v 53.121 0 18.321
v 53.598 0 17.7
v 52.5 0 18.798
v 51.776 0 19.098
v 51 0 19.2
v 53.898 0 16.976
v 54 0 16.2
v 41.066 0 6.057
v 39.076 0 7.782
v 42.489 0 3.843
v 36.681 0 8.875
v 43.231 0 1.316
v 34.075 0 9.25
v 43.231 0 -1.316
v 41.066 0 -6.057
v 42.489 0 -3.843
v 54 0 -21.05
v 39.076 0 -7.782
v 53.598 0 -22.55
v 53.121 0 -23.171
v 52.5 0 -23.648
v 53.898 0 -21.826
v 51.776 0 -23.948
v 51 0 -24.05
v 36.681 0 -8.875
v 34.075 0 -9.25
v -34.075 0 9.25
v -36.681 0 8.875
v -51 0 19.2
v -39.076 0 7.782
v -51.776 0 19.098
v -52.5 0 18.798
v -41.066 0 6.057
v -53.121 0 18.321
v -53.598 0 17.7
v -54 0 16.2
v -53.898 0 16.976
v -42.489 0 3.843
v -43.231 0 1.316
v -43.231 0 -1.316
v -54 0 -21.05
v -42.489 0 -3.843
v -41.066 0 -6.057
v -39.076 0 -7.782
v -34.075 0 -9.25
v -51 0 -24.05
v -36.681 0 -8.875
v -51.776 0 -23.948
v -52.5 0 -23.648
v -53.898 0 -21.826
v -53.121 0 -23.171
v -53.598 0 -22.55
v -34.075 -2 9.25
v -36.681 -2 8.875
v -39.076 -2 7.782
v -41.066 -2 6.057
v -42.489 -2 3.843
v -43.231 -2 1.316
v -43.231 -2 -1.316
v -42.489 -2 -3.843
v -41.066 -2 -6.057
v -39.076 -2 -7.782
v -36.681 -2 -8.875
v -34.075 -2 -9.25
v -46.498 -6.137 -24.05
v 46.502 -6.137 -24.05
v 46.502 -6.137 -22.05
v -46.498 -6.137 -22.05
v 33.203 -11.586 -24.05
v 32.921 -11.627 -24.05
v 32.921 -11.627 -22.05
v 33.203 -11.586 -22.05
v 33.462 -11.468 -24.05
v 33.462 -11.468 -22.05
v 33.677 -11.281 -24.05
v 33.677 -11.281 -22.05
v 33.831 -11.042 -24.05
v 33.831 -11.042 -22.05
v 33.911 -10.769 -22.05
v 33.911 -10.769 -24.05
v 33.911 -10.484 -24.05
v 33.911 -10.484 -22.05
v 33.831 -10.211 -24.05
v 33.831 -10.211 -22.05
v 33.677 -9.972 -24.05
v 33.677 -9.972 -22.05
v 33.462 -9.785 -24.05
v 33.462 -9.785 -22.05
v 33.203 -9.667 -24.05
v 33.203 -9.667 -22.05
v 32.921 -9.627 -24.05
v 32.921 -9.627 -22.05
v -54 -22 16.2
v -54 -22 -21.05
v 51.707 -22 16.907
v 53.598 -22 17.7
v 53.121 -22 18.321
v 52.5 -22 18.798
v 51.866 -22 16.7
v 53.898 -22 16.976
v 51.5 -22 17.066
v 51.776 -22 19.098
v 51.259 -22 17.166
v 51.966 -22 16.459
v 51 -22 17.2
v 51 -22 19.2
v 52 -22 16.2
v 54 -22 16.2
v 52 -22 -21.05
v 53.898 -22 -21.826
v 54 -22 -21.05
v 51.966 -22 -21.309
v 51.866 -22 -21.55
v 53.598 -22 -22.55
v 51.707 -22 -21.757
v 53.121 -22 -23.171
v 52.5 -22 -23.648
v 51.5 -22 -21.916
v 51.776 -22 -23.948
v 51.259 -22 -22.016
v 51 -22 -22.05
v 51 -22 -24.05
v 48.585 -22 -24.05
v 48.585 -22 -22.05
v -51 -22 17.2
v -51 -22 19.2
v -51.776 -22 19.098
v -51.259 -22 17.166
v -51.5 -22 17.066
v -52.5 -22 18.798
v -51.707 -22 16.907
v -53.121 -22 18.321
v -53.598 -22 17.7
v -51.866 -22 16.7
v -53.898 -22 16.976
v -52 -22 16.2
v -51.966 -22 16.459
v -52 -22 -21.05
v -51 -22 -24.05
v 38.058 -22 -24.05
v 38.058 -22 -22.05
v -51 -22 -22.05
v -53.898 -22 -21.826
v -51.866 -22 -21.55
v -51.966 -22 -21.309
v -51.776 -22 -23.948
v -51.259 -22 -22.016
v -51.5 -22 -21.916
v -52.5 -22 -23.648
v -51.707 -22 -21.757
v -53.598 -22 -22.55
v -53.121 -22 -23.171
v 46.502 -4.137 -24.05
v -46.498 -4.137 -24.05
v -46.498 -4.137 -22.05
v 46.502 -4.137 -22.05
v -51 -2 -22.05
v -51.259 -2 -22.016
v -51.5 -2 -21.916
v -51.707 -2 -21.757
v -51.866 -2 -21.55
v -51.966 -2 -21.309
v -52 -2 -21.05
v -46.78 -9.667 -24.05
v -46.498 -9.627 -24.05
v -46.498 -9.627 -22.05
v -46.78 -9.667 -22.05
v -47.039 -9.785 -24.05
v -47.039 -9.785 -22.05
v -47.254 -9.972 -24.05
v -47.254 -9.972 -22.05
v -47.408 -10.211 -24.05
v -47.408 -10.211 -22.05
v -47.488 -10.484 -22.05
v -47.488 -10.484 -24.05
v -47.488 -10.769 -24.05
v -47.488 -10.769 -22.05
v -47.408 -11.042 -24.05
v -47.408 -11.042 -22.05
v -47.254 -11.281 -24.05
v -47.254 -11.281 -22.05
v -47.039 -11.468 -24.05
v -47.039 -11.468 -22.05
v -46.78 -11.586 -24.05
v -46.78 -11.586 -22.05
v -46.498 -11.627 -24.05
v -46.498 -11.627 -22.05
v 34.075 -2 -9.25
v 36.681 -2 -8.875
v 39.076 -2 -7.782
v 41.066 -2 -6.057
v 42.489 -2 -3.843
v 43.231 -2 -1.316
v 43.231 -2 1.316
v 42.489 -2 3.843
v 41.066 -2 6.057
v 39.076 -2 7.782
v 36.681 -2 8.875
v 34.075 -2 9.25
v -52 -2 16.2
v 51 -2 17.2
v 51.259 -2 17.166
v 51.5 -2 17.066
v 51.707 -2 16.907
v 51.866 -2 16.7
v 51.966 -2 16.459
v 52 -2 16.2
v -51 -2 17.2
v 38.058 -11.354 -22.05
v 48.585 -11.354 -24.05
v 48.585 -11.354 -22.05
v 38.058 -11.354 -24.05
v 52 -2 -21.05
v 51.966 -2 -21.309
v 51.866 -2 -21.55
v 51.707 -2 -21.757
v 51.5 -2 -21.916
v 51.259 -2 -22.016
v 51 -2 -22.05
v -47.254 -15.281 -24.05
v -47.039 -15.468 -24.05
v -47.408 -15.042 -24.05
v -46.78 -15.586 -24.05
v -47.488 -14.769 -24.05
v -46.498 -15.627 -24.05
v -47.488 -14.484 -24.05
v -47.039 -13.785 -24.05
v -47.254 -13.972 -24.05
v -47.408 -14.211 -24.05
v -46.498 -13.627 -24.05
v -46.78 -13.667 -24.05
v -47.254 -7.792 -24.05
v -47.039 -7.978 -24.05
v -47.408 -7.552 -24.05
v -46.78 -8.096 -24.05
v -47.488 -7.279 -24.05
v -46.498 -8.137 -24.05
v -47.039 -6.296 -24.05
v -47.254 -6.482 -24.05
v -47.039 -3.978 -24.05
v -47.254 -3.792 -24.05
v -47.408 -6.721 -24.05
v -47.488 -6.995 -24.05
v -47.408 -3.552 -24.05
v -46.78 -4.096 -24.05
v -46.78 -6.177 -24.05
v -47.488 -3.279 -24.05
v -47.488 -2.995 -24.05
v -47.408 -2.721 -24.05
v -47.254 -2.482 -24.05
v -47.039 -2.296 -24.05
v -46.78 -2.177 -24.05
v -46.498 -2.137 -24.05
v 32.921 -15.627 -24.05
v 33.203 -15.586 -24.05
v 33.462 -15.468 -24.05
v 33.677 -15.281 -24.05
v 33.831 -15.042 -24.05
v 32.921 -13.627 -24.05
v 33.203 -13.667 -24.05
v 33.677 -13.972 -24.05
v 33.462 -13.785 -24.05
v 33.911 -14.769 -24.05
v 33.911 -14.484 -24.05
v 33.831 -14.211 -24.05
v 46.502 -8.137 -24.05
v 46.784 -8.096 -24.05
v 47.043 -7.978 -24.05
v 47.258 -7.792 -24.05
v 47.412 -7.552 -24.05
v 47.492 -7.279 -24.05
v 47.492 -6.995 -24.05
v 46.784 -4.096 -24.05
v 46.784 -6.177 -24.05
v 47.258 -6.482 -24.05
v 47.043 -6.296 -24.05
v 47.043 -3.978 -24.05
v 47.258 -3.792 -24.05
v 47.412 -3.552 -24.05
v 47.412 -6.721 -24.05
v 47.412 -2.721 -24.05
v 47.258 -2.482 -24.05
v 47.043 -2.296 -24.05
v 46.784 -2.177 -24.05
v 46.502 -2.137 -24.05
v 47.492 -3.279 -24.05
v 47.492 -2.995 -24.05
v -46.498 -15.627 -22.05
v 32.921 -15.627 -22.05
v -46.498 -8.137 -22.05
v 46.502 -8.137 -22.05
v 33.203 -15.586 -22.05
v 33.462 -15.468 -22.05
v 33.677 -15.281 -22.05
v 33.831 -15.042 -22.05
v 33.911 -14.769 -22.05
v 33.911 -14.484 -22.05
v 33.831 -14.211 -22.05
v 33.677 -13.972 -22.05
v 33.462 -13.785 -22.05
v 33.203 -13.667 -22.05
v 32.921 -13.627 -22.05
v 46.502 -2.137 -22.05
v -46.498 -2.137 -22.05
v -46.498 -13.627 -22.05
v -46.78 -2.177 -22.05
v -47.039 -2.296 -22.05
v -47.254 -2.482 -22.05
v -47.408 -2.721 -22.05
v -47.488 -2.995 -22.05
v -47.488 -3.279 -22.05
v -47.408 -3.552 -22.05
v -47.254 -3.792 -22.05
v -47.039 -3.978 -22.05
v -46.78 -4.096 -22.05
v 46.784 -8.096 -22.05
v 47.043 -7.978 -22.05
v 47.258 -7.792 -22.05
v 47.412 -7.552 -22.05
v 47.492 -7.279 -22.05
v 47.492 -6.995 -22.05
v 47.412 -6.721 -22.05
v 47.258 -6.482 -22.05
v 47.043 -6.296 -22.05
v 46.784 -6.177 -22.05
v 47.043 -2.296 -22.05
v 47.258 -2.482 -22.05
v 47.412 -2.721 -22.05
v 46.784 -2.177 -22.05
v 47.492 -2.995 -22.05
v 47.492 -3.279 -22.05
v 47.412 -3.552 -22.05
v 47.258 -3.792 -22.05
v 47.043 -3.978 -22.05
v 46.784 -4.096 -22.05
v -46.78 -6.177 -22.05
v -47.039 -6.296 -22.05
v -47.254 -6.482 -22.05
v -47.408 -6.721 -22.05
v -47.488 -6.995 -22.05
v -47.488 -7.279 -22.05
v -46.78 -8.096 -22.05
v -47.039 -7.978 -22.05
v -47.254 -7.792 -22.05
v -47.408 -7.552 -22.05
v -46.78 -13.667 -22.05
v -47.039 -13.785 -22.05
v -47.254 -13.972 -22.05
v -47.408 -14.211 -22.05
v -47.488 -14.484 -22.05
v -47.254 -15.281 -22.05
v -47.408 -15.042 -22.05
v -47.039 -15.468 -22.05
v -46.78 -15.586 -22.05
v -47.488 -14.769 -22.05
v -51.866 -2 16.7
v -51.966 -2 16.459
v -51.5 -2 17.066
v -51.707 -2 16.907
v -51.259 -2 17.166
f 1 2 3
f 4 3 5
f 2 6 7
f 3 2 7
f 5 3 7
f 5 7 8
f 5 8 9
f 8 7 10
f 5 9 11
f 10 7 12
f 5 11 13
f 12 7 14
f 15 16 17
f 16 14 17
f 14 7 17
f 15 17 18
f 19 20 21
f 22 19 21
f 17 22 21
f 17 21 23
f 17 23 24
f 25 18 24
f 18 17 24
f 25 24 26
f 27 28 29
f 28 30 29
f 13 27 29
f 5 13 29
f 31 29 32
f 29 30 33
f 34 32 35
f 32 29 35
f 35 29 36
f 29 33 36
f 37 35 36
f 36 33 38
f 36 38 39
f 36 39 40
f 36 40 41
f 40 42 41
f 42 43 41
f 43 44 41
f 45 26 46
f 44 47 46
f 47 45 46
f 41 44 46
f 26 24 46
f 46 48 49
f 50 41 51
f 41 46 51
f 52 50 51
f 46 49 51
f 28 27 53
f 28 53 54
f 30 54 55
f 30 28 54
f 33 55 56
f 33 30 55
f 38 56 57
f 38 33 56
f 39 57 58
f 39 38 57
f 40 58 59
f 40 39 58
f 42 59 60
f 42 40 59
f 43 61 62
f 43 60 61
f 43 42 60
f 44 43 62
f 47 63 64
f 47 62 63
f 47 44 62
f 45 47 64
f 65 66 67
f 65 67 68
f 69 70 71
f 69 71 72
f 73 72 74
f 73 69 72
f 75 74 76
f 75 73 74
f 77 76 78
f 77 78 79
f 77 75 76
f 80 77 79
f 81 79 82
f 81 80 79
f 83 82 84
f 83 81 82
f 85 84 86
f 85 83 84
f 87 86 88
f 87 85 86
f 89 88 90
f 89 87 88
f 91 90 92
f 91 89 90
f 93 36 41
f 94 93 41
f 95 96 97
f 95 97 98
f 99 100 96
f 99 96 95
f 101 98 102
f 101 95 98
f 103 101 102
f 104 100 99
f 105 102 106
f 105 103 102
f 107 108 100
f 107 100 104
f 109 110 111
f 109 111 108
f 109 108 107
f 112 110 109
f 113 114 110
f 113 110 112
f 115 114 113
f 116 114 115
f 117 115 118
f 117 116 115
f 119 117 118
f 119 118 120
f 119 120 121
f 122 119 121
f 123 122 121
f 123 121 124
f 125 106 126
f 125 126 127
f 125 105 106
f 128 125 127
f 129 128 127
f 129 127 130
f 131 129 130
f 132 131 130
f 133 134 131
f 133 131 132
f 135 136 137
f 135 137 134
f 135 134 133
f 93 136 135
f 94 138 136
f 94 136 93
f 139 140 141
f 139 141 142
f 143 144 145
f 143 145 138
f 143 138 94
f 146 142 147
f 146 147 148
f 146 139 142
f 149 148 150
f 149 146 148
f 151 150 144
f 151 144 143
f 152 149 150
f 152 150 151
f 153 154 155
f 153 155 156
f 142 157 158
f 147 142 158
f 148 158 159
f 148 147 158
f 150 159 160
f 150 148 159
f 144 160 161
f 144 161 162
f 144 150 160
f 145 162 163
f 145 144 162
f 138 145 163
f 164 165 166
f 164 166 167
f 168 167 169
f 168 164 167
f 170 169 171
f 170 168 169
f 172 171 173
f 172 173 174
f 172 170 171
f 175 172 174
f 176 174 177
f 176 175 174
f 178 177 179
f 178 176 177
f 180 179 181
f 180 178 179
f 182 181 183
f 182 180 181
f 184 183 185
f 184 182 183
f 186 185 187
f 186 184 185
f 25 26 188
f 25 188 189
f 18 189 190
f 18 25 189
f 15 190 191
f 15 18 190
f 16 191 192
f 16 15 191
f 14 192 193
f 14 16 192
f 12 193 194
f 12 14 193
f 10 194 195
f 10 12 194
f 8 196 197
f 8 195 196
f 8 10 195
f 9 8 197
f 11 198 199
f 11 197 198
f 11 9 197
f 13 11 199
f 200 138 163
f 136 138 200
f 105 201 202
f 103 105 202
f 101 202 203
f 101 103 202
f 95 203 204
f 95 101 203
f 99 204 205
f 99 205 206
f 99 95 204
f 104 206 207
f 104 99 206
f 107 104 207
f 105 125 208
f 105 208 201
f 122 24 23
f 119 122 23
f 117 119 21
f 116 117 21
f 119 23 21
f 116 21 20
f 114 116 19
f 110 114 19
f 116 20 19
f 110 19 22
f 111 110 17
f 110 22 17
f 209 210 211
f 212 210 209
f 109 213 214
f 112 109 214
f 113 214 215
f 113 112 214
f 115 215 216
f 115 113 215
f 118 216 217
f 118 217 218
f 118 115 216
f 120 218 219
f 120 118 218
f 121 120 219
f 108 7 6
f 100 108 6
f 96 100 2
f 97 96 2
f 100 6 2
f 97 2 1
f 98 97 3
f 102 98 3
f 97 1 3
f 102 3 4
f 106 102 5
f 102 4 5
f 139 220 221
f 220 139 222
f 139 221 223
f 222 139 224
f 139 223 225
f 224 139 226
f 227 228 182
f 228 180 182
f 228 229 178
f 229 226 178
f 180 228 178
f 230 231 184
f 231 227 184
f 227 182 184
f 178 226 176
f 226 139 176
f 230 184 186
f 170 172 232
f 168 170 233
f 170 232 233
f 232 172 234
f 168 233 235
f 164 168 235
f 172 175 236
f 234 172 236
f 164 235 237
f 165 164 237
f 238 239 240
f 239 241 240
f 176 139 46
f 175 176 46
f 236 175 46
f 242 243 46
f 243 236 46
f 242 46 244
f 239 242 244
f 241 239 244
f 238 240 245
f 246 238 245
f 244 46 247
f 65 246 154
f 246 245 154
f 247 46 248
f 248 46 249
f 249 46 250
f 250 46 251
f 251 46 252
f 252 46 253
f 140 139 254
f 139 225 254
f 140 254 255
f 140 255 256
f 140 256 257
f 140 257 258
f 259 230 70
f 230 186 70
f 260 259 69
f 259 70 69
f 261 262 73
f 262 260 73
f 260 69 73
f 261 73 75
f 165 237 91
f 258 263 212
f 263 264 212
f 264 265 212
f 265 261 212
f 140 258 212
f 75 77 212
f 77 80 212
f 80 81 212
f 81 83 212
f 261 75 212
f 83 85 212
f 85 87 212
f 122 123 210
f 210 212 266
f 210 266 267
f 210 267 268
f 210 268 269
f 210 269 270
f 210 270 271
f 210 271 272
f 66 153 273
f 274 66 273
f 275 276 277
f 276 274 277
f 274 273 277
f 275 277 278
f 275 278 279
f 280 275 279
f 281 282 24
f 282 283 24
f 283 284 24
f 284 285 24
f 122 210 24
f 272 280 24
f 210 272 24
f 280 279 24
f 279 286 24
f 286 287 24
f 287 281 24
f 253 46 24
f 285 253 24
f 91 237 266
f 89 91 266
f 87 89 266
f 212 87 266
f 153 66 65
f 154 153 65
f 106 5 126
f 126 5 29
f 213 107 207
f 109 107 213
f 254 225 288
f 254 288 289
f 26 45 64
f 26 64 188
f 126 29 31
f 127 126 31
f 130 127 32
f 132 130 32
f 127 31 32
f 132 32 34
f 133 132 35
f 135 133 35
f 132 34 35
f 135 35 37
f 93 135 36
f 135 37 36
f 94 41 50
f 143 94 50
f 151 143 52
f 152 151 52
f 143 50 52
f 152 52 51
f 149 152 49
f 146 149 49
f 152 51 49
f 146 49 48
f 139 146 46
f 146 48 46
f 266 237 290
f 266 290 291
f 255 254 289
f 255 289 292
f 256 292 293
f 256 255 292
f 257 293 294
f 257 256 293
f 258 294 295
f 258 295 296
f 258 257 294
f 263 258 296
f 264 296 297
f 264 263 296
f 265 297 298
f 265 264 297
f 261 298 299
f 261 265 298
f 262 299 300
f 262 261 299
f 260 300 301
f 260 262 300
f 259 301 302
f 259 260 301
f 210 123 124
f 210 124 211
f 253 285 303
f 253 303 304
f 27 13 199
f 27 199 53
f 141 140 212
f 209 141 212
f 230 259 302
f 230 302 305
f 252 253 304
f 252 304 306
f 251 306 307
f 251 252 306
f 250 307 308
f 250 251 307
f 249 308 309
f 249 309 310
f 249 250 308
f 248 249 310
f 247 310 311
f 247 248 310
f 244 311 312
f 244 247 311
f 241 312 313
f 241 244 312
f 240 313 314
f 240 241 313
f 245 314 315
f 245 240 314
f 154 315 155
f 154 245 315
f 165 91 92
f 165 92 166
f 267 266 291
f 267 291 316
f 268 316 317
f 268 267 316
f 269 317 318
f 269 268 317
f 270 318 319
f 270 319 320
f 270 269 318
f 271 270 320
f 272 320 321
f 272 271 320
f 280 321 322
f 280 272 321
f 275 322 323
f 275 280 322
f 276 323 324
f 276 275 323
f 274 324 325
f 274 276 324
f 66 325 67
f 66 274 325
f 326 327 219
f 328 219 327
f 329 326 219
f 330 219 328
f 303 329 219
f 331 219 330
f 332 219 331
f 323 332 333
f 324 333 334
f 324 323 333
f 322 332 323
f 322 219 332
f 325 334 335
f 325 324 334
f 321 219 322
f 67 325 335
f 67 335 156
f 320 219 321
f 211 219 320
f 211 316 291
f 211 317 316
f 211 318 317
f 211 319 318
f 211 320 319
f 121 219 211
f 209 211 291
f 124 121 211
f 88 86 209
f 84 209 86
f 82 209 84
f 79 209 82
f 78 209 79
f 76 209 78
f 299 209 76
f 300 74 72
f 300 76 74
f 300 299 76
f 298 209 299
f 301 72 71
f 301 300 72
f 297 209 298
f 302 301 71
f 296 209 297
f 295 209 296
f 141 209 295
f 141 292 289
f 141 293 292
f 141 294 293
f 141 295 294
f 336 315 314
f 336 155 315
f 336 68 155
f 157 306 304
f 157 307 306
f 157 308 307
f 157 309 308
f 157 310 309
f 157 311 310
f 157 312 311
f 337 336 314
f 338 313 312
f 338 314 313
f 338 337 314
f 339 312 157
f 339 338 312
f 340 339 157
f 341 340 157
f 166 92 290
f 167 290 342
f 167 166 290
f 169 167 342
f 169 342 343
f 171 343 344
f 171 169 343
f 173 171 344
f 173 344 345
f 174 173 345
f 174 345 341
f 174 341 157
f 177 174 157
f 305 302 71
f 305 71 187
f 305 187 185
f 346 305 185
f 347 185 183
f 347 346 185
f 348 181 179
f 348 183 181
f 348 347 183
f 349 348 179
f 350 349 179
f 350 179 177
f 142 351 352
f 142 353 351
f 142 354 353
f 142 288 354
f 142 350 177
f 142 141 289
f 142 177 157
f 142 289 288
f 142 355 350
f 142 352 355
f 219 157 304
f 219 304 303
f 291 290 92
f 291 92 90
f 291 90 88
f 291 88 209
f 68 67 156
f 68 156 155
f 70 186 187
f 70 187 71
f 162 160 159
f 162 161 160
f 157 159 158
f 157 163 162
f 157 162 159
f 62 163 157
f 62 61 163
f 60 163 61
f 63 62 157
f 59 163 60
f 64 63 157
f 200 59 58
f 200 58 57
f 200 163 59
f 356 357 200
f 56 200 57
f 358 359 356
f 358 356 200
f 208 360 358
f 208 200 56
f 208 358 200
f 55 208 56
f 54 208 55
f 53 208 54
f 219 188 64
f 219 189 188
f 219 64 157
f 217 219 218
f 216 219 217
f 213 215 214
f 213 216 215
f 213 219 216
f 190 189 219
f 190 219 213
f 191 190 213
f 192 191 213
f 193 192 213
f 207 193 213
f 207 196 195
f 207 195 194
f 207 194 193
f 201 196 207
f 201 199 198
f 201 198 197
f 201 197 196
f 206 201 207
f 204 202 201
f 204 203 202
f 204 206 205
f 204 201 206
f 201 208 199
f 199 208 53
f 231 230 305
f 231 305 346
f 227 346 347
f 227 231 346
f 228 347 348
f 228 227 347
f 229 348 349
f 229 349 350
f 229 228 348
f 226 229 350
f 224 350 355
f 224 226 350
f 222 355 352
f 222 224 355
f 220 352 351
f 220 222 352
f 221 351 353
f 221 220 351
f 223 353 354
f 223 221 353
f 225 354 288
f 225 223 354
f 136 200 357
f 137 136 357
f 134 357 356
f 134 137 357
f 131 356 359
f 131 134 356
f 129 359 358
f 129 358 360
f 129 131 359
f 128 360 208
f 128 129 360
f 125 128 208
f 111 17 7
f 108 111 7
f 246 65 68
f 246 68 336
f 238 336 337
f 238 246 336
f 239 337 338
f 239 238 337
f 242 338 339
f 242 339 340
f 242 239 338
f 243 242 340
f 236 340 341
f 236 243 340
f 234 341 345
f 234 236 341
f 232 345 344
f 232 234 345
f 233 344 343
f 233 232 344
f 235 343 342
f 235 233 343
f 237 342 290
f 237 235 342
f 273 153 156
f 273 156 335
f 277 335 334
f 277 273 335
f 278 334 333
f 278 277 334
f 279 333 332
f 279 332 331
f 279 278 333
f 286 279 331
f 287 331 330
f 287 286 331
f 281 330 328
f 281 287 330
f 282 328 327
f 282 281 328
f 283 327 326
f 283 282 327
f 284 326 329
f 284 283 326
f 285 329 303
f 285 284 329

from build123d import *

# Parameters (mm, degrees)
BOSS_EXTRUDE2_DEPTH = 22
SHELL1_START        = -22
SHELL1_DEPTH        = 20
SKETCH2_W           = 99.356893422
SKETCH2_H           = 33.700277524
CUT_EXTRUDE1_DEPTH  = 20
SKETCH3_W           = 10.526500884
SKETCH3_H           = 10.645693642
CUT_EXTRUDE2_DEPTH  = 2
CUT_EXTRUDE3_DEPTH  = 2


# Read off the part's stored shape, not the designer's step: Shell1
with BuildPart() as part:
    # Sketch1 → Boss-Extrude2 (new body)
    with BuildSketch(Plane(origin=(0, 0, 0), x_dir=(1, 0, 0), z_dir=(0, 1, 0))):
        with BuildLine():
            Line((-51, 24.05), (51, 24.05))
            ThreePointArc((51, 24.05), (53.121320344, 23.171320344), (54, 21.05))
            Line((54, 21.05), (54, -16.2))
            ThreePointArc((54, -16.2), (53.121320344, -18.321320344), (51, -19.2))
            Line((51, -19.2), (-51, -19.2))
            ThreePointArc((-51, -19.2), (-53.121320344, -18.321320344), (-54, -16.2))
            Line((-54, -16.2), (-54, 21.05))
            ThreePointArc((-54, 21.05), (-53.121320344, 23.171320344), (-51, 24.05))
        make_face()
        with BuildLine():
            Line((-34.075, 9.25), (34.075, 9.25))
            ThreePointArc((34.075, 9.25), (43.325, 0), (34.075, -9.25))
            Line((34.075, -9.25), (-34.075, -9.25))
            ThreePointArc((-34.075, -9.25), (-43.325, 0), (-34.075, 9.25))
        make_face(mode=Mode.SUBTRACT)
    extrude(amount=-BOSS_EXTRUDE2_DEPTH)

    # Shell1 outline → Shell1 (cut)
    with BuildSketch(Plane(origin=(0, 0, 0), x_dir=(1, 0, 0), z_dir=(0, 1, 0)).offset(SHELL1_START)):
        with BuildLine():
            Line((-52, 21.05), (-52, -16.2))
            ThreePointArc((-52, -16.2), (-51.707106781, -16.907106781), (-51, -17.2))
            Line((-51, -17.2), (51, -17.2))
            ThreePointArc((51, -17.2), (51.707106781, -16.907106781), (52, -16.2))
            Line((52, -16.2), (52, 21.05))
            ThreePointArc((52, 21.05), (51.707106781, 21.757106781), (51, 22.05))
            Line((51, 22.05), (-51, 22.05))
            ThreePointArc((-51, 22.05), (-51.707106781, 21.757106781), (-52, 21.05))
        make_face()
        with BuildLine():
            ThreePointArc((-34.075, -11.25), (-45.325, 0), (-34.075, 11.25))
            Line((-34.075, 11.25), (34.075, 11.25))
            ThreePointArc((34.075, 11.25), (45.325, 0), (34.075, -11.25))
            Line((34.075, -11.25), (-34.075, -11.25))
        make_face(mode=Mode.SUBTRACT)
    extrude(amount=SHELL1_DEPTH, mode=Mode.SUBTRACT)

    # Sketch2 → Cut-Extrude1 (cut)
    with BuildSketch(Plane.XZ.offset(22)):
        Rectangle(SKETCH2_W, SKETCH2_H)
    extrude(amount=-CUT_EXTRUDE1_DEPTH, mode=Mode.SUBTRACT)

    # Sketch3 → Cut-Extrude2 (cut)
    with BuildSketch(Plane(origin=(0, 0, -24.05), x_dir=(-1, 0, 0), z_dir=(0, 0, -1))):
        with Locations((-43.321442995, -16.677153179)):
            Rectangle(SKETCH3_W, SKETCH3_H)
    extrude(amount=-CUT_EXTRUDE2_DEPTH, mode=Mode.SUBTRACT)

    # Sketch6 → Cut-Extrude3 (cut)
    with BuildSketch(Plane(origin=(0, 0, -24.05), x_dir=(-1, 0, 0), z_dir=(0, 0, -1))):
        with BuildLine():
            Line((46.497989358, -4.136848822), (-46.502010642, -4.136848822))
            ThreePointArc((-46.502010642, -4.136848822), (-47.502010642, -3.136848822), (-46.502010642, -2.136848822))
            Line((-46.502010642, -2.136848822), (46.497989358, -2.136848822))
            ThreePointArc((46.497989358, -2.136848822), (47.497989358, -3.136848822), (46.497989358, -4.136848822))
        make_face()
        with BuildLine():
            Line((46.497989358, -8.136848822), (-46.502010642, -8.136848822))
            ThreePointArc((-46.502010642, -8.136848822), (-47.502010642, -7.136848822), (-46.502010642, -6.136848822))
            Line((-46.502010642, -6.136848822), (46.497989358, -6.136848822))
            ThreePointArc((46.497989358, -6.136848822), (47.497989358, -7.136848822), (46.497989358, -8.136848822))
        make_face()
        with BuildLine():
            Line((-32.921100396, -9.626506099), (46.497989358, -9.626506099))
            ThreePointArc((46.497989358, -9.626506099), (47.497989358, -10.626506099), (46.497989358, -11.626506099))
            Line((46.497989358, -11.626506099), (-32.921100396, -11.626506099))
            ThreePointArc((-32.921100396, -11.626506099), (-33.921100396, -10.626506099), (-32.921100396, -9.626506099))
        make_face()
        with BuildLine():
            Line((-32.921100396, -13.626506099), (46.497989358, -13.626506099))
            ThreePointArc((46.497989358, -13.626506099), (47.497989358, -14.626506099), (46.497989358, -15.626506099))
            Line((46.497989358, -15.626506099), (-32.921100396, -15.626506099))
            ThreePointArc((-32.921100396, -15.626506099), (-33.921100396, -14.626506099), (-32.921100396, -13.626506099))
        make_face()
    extrude(amount=-CUT_EXTRUDE3_DEPTH, mode=Mode.SUBTRACT)


solid = part.part
